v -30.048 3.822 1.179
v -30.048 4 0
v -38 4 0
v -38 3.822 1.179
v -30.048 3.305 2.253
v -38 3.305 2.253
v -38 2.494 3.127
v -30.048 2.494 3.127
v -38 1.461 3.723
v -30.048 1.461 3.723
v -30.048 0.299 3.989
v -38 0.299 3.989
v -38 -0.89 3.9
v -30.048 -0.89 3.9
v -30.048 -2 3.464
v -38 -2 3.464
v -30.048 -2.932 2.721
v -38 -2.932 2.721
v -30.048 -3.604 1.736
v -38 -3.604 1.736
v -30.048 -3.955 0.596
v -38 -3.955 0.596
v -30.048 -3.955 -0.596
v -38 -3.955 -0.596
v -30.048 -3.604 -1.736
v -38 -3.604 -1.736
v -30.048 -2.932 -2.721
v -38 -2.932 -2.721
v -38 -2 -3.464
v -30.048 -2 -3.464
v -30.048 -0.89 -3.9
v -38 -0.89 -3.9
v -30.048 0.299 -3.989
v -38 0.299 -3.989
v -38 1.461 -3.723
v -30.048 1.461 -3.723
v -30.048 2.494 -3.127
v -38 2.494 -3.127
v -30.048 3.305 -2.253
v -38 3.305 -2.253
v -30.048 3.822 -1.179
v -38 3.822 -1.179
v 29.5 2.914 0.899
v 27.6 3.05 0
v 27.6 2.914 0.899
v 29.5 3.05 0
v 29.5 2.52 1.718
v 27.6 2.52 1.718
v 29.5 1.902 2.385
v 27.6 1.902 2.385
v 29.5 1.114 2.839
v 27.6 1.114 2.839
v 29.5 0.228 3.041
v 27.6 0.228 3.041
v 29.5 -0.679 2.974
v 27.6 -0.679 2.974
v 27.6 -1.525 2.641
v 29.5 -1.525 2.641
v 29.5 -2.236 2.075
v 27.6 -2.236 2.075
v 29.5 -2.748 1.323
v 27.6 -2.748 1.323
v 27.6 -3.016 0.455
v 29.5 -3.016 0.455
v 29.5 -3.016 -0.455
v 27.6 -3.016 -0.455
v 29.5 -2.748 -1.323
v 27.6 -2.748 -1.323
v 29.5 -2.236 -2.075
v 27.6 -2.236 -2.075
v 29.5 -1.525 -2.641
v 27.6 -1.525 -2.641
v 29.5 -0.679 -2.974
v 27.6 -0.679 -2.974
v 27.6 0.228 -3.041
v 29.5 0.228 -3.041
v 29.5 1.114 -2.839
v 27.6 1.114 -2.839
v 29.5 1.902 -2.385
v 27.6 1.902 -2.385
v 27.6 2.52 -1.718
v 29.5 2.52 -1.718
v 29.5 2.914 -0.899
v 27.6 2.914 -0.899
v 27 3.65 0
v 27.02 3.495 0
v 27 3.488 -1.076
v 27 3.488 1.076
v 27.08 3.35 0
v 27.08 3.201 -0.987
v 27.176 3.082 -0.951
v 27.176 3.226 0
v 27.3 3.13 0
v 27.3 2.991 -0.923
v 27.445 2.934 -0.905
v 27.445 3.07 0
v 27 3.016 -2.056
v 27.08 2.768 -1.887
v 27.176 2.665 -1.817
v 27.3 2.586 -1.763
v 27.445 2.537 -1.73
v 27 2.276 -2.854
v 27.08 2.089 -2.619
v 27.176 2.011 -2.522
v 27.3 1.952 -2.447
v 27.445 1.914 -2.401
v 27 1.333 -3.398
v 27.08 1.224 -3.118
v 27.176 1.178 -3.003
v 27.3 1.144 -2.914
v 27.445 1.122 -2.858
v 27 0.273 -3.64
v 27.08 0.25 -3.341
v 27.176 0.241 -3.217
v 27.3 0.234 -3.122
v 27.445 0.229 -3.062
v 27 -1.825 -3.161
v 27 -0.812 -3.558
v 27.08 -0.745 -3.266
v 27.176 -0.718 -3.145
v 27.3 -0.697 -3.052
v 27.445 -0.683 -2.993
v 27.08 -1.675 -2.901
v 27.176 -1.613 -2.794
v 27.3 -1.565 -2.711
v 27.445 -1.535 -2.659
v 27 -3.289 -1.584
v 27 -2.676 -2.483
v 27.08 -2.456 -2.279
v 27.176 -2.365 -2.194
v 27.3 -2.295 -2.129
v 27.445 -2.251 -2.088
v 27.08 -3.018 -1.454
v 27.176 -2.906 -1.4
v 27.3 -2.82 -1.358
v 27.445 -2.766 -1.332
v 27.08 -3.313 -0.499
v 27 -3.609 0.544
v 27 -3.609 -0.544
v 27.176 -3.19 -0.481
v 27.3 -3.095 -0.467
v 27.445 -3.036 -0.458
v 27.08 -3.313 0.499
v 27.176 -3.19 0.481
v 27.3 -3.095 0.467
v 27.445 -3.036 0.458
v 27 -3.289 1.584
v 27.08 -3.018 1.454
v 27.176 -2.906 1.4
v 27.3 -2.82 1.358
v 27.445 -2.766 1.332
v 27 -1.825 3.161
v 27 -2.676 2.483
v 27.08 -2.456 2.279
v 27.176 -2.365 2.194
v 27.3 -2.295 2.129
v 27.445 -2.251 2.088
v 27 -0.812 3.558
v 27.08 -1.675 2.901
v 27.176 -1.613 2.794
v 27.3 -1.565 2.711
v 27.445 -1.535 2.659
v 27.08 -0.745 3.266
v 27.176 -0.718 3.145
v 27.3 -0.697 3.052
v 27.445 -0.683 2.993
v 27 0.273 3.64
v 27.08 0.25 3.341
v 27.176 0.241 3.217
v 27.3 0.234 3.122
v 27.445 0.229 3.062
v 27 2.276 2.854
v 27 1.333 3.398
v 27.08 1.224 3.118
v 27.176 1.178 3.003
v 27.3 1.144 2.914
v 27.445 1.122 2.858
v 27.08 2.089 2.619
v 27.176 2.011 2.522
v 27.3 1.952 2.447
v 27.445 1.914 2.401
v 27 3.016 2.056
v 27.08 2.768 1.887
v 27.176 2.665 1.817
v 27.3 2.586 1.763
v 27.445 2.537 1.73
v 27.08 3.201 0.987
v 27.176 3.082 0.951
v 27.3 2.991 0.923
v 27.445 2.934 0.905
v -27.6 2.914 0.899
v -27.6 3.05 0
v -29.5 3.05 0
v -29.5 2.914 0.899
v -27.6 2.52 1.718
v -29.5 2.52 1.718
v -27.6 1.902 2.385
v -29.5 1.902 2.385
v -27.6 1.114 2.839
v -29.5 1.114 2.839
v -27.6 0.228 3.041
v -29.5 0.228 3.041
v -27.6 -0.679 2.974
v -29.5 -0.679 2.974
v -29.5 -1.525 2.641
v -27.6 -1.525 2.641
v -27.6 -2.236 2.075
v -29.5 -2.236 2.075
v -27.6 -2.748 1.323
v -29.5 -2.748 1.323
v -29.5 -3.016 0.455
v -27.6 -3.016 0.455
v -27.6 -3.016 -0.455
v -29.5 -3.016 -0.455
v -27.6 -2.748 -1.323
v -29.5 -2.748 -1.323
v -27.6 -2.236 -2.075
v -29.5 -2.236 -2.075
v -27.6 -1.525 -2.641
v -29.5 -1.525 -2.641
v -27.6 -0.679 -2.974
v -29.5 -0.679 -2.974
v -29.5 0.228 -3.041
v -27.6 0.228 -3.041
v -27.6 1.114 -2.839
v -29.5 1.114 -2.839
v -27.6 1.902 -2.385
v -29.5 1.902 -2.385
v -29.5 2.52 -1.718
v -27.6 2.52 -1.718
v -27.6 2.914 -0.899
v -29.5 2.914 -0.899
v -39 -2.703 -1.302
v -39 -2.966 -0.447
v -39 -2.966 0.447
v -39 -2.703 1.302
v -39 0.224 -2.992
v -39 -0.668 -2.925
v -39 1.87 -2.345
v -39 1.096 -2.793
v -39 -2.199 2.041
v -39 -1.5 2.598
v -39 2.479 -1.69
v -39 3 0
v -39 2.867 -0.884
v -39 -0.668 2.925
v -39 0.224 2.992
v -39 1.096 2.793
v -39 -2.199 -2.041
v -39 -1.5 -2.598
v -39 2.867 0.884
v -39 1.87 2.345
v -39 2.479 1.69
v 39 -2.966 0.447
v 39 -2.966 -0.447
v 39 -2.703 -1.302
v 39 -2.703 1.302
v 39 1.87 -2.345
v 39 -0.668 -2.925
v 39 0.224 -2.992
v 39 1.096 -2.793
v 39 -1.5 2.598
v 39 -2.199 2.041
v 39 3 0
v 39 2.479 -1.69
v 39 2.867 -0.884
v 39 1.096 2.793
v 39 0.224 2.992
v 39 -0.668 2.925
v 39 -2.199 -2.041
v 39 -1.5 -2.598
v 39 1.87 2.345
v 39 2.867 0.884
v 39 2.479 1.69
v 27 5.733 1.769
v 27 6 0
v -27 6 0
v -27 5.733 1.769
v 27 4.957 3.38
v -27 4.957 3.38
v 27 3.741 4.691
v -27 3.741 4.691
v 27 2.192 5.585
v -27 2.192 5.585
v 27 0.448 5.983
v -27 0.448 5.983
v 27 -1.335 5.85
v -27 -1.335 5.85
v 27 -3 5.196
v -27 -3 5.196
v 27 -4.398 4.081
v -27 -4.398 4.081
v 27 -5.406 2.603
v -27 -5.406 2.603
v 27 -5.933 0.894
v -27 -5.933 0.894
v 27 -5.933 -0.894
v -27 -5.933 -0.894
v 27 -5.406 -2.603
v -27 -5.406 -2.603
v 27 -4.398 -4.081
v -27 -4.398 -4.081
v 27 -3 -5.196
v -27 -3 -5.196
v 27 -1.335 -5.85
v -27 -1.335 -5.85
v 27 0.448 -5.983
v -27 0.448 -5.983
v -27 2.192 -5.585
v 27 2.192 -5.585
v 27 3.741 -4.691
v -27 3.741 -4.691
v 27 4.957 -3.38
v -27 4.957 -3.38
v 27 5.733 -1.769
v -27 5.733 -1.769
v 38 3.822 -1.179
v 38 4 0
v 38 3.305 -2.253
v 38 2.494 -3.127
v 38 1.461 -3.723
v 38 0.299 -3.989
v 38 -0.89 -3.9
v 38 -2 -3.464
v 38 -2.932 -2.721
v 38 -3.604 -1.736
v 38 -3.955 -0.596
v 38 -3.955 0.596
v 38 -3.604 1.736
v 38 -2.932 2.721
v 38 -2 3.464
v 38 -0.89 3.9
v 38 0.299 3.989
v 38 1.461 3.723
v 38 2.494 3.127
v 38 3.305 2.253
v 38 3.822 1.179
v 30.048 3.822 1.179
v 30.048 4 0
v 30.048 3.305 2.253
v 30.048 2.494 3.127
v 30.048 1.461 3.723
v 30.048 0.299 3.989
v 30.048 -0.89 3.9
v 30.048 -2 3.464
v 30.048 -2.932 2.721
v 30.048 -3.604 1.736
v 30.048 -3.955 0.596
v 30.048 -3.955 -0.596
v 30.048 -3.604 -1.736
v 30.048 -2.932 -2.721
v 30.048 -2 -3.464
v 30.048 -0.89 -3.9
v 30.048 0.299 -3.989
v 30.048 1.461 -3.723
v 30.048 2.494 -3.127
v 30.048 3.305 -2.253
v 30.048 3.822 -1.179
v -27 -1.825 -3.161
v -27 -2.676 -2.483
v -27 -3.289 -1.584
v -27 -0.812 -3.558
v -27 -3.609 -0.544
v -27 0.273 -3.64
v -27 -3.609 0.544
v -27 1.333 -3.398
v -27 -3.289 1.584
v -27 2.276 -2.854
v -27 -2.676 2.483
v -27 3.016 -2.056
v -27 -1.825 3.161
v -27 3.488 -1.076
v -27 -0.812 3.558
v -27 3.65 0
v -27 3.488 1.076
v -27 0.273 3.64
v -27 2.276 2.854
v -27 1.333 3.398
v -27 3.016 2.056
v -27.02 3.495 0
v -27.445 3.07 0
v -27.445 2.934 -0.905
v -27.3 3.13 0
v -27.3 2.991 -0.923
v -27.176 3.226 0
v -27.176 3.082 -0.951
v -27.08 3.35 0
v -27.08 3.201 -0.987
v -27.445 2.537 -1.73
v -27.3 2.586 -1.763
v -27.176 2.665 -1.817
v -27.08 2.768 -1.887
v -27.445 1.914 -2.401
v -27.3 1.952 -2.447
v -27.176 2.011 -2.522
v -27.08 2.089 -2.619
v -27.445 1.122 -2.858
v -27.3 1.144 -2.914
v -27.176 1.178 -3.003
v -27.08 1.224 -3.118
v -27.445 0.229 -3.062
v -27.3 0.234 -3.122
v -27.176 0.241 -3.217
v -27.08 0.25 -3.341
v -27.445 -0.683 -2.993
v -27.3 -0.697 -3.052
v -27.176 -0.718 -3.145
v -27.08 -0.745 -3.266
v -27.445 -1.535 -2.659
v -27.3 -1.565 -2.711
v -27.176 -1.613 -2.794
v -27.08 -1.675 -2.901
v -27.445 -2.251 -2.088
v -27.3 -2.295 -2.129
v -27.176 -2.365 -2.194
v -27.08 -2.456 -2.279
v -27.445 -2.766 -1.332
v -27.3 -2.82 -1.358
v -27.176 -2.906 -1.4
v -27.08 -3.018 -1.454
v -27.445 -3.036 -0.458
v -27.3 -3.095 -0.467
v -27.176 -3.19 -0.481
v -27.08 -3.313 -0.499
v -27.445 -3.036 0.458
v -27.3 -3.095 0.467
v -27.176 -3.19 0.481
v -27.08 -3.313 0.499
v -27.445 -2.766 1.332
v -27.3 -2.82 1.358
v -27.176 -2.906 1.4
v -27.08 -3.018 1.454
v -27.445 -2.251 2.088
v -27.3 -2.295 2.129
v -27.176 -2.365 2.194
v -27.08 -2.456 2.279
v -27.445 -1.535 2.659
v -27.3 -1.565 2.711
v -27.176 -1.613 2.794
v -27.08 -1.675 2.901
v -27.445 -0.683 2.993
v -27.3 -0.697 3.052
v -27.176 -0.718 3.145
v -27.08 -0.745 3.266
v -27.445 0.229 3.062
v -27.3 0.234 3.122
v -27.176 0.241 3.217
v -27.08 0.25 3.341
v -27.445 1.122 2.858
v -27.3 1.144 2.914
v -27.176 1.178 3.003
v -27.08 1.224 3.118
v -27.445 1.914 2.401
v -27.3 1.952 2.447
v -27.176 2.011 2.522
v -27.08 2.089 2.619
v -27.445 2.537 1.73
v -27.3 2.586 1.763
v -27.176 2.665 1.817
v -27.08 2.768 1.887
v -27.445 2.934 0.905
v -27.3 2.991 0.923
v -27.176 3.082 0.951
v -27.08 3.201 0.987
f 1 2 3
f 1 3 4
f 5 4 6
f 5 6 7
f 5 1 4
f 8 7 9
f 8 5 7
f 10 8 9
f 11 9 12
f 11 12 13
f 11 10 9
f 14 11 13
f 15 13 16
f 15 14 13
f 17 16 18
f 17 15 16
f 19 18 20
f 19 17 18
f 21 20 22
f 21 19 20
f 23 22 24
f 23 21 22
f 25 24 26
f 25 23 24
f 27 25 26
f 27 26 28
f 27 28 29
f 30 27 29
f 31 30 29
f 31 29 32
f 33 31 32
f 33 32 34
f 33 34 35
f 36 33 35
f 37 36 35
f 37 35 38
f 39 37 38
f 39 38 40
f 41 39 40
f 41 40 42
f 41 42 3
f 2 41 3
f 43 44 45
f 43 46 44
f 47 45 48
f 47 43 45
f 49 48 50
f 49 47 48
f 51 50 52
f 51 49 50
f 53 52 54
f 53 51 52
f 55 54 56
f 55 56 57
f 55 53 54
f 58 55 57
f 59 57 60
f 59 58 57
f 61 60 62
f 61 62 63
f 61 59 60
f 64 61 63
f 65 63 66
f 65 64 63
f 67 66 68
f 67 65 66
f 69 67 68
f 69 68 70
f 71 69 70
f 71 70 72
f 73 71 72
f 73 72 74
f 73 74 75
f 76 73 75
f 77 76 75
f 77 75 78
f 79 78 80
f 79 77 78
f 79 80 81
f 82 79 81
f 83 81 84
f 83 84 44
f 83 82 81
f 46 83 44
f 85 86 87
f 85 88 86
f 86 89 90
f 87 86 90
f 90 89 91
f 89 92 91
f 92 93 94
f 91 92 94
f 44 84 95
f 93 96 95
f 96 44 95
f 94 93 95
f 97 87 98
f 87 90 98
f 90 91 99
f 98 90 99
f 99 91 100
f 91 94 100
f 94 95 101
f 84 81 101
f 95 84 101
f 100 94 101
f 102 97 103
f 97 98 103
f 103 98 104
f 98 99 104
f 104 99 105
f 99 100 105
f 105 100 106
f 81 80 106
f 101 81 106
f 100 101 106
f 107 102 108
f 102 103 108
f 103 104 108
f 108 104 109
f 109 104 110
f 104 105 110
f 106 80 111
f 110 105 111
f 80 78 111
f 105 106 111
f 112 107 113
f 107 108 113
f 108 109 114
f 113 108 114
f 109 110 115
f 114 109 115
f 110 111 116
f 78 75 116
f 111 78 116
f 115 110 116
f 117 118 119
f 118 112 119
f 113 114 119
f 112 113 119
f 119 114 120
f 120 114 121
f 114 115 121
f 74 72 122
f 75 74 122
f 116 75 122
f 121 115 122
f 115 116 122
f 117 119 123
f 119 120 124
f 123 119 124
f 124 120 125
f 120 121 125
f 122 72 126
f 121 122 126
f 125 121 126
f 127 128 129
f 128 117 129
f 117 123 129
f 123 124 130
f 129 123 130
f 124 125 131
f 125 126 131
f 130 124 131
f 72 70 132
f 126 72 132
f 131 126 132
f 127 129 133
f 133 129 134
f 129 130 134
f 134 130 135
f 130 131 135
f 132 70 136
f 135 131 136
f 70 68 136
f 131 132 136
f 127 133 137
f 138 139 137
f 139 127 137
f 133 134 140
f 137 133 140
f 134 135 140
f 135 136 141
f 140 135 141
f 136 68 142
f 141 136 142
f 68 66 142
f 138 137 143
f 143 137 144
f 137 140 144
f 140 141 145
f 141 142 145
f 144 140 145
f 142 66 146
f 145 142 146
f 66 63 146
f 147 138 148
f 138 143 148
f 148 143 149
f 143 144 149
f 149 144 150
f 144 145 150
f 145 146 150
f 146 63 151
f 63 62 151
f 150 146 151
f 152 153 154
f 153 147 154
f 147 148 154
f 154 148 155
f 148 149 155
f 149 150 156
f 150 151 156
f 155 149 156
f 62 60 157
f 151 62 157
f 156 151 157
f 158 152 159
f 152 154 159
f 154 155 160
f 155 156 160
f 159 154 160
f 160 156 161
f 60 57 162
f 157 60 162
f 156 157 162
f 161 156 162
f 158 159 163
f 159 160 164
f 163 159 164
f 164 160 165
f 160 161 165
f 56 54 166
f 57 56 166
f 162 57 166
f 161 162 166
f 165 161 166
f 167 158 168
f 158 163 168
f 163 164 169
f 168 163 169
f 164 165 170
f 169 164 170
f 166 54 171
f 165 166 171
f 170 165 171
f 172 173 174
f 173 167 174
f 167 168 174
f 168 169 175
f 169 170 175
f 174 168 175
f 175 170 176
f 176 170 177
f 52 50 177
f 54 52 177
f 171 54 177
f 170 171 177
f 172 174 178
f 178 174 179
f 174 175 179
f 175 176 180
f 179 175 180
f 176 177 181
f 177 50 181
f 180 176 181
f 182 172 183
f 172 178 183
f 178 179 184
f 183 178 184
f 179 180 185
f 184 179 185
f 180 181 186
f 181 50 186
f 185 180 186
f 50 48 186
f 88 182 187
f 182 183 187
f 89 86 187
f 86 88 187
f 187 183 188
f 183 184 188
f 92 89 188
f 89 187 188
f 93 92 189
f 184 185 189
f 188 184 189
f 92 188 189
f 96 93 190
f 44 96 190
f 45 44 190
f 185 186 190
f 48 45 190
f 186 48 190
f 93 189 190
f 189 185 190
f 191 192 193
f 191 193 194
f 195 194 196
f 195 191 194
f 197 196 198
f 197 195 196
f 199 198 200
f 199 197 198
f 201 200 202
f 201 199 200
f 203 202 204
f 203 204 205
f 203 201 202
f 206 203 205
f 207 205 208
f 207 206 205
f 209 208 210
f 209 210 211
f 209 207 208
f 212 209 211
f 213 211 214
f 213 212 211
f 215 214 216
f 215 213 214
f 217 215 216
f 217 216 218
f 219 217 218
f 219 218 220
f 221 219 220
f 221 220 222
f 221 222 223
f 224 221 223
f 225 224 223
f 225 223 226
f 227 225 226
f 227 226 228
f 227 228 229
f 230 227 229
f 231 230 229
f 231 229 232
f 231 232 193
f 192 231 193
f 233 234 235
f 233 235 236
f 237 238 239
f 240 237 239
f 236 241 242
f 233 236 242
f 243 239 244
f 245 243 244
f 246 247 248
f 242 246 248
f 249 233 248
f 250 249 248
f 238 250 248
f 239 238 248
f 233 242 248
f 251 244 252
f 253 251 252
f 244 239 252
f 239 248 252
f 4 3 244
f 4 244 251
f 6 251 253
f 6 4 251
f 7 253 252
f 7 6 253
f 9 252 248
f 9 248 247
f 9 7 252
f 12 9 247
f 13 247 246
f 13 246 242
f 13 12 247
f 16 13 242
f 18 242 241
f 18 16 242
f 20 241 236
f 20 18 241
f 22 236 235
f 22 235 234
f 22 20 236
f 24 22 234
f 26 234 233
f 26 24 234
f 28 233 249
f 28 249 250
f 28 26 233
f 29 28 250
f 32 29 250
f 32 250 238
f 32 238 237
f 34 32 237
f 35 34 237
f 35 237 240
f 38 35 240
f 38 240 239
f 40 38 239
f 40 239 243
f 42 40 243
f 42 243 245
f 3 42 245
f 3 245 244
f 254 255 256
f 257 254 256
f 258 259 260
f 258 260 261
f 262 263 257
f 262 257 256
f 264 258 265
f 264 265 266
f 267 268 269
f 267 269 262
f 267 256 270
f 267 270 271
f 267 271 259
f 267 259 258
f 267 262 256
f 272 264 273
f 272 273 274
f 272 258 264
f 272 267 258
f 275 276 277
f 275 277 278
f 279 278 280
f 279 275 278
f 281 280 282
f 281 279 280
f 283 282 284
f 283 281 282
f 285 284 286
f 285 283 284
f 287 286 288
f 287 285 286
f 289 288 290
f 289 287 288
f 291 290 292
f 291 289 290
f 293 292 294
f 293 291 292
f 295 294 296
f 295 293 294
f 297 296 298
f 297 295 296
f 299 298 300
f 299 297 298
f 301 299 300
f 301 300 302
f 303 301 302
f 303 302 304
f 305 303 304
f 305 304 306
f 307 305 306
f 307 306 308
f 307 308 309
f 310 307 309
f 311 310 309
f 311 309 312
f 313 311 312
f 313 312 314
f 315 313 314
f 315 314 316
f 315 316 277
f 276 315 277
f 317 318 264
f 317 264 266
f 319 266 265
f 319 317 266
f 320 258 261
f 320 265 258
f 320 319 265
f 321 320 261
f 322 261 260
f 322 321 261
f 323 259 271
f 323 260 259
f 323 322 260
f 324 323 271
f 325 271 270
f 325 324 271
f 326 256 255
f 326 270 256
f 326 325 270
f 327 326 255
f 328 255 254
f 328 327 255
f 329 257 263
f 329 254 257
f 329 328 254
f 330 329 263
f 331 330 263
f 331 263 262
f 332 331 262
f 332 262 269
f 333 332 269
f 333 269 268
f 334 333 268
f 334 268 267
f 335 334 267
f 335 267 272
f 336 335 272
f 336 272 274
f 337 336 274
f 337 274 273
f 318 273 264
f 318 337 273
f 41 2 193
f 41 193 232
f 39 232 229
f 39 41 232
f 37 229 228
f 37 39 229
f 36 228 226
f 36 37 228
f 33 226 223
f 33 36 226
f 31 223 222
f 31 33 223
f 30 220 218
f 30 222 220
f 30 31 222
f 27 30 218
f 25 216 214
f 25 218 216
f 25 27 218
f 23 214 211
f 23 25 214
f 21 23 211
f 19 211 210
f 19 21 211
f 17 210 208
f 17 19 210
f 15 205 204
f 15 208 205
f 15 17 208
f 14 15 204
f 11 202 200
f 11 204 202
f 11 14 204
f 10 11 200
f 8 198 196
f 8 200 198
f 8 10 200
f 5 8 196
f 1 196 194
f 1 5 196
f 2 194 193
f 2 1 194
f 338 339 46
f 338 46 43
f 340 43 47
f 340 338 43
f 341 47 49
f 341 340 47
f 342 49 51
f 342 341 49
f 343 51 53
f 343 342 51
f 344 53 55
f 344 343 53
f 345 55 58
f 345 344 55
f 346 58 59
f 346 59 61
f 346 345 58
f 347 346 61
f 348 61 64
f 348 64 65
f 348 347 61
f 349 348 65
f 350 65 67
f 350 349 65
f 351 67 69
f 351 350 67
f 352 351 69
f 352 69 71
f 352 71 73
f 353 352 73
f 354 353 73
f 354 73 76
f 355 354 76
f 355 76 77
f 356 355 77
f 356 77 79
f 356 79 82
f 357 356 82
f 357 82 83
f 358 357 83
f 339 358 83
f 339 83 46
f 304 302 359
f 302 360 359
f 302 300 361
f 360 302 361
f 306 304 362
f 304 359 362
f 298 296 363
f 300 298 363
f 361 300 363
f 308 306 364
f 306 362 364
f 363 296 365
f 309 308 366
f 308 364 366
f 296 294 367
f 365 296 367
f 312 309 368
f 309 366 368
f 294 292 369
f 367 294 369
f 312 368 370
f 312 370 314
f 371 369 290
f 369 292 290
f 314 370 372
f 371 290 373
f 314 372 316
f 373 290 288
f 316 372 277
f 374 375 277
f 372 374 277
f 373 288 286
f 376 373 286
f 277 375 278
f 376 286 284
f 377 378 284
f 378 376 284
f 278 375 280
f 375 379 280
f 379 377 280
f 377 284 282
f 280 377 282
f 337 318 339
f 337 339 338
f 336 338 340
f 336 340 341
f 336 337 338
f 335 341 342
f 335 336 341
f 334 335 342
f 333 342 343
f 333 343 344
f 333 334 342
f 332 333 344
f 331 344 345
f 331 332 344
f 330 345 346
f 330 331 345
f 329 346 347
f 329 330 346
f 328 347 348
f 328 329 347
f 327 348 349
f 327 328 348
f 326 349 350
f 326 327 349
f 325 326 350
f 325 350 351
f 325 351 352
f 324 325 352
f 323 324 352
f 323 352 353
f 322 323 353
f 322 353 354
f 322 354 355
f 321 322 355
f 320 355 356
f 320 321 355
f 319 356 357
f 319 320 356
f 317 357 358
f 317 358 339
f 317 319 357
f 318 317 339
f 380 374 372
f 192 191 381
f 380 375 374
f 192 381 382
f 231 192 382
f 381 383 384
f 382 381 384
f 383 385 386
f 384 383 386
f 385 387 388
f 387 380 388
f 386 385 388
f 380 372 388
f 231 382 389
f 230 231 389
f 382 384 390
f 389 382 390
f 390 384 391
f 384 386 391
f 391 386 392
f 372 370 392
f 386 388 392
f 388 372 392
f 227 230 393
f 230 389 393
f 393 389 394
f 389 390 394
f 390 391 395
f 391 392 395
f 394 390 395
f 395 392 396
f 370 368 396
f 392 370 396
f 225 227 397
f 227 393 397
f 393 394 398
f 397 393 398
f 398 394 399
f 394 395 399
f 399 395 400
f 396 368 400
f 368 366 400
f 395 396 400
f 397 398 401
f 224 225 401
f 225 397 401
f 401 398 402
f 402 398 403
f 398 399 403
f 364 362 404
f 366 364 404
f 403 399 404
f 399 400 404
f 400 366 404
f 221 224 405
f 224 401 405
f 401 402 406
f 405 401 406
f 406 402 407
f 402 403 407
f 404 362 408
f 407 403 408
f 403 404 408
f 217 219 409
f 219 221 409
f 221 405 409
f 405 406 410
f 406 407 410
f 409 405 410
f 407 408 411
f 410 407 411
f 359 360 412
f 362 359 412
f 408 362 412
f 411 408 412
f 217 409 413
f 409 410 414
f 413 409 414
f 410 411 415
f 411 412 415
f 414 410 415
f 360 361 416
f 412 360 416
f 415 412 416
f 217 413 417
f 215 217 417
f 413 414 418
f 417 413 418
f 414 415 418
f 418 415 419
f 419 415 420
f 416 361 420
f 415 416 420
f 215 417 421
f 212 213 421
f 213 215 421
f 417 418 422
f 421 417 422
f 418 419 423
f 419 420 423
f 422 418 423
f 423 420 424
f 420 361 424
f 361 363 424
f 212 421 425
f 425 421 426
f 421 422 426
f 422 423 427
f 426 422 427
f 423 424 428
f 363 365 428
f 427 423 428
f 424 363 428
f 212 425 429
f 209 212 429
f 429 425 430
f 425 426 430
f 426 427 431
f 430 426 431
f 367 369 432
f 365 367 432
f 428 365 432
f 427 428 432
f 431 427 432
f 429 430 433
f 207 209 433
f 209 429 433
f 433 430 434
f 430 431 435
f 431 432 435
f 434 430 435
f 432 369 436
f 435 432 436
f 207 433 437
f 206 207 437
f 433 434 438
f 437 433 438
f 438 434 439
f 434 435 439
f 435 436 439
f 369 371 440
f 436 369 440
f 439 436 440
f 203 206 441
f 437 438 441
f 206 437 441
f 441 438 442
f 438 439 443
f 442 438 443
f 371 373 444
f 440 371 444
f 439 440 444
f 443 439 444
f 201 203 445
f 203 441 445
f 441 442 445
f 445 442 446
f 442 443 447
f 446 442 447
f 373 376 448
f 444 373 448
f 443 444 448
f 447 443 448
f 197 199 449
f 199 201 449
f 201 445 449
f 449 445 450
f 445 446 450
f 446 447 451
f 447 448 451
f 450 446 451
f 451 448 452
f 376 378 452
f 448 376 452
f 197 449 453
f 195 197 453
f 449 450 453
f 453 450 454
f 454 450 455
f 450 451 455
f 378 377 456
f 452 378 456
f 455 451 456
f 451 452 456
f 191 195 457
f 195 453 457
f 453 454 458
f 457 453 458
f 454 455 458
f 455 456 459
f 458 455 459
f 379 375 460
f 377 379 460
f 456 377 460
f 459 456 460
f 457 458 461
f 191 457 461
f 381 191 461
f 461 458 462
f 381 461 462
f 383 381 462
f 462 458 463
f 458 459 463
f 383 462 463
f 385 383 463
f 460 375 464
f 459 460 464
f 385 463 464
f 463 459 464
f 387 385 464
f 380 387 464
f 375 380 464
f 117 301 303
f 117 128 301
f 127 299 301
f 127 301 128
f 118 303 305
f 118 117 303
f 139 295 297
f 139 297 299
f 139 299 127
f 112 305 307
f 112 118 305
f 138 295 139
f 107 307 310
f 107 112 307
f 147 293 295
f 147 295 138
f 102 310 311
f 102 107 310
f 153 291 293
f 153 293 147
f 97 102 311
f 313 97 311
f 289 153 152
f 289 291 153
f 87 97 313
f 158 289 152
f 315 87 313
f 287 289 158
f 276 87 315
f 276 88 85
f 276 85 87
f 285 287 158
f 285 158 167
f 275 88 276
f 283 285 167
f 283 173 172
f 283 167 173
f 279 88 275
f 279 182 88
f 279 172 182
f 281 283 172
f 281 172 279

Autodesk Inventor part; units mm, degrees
ref_plane "YZ Plane" through (0, 0, 0) normal (1, 0, 0) x (0, 1, 0)
ref_plane "XZ Plane" through (0, 0, 0) normal (0, 1, 0) x (-1, 0, 0)
ref_plane "XY Plane" through (0, 0, 0) normal (0, 0, 1) x (1, 0, 0)
sketch "Sketch1" plane through (0, 0, 0) normal (0, 0, 1) x (1, 0, 0)
  line L0 (-46.8, 0) -> (62.4, 0) projected
  line L1 (0, 7.8) -> (0, -0.6) projected
  line L2 (-39, 0) -> (-39, 4)
  line L3 (-39, 4) -> (-30.0485, 4)
  line L4 (-30.0485, 4) -> (-29.5, 3.05)
  line L5 (-29.5, 3.05) -> (-27, 3.05)
  line L6 (-27, 3.05) -> (-27, 6)
  line L7 (-27, 6) -> (27, 6)
  line L8 (27, 6) -> (27, 3.05)
  line L9 (27, 3.05) -> (29.5, 3.05)
  line L10 (29.5, 3.05) -> (30.0485, 4)
  line L11 (30.0485, 4) -> (39, 4)
  line L12 (39, 4) -> (39, 0)
  line L13 (-39, 0) -> (39, 0)
  dimension "d0" = 4
  dimension "d1" = 60
  dimension "d2" = 12
  dimension "d3" = 78
  dimension "d4" = 3.05
  dimension "d5" = 60
  dimension "d6" = 4
  dimension "d7" = 12
  dimension "d8" = 6
  dimension "d9" = 2.5
  dimension "d10" = 2.5
  dimension "d11" = 3.05
revolve "Revolution1" add sketch "Sketch1" angle 360 about axis through (-39, 0, 0) along (1, 0, 0)
chamfer "Chamfer1" distance 1 angle 45 2 edges at (39, -4, 0) (-39, -4, 0)
fillet "Fillet1" radius 0.6 2 edges at (-27, -3.05, 0) (27, -3.05, 0)
properties part number "Pin Seized"
